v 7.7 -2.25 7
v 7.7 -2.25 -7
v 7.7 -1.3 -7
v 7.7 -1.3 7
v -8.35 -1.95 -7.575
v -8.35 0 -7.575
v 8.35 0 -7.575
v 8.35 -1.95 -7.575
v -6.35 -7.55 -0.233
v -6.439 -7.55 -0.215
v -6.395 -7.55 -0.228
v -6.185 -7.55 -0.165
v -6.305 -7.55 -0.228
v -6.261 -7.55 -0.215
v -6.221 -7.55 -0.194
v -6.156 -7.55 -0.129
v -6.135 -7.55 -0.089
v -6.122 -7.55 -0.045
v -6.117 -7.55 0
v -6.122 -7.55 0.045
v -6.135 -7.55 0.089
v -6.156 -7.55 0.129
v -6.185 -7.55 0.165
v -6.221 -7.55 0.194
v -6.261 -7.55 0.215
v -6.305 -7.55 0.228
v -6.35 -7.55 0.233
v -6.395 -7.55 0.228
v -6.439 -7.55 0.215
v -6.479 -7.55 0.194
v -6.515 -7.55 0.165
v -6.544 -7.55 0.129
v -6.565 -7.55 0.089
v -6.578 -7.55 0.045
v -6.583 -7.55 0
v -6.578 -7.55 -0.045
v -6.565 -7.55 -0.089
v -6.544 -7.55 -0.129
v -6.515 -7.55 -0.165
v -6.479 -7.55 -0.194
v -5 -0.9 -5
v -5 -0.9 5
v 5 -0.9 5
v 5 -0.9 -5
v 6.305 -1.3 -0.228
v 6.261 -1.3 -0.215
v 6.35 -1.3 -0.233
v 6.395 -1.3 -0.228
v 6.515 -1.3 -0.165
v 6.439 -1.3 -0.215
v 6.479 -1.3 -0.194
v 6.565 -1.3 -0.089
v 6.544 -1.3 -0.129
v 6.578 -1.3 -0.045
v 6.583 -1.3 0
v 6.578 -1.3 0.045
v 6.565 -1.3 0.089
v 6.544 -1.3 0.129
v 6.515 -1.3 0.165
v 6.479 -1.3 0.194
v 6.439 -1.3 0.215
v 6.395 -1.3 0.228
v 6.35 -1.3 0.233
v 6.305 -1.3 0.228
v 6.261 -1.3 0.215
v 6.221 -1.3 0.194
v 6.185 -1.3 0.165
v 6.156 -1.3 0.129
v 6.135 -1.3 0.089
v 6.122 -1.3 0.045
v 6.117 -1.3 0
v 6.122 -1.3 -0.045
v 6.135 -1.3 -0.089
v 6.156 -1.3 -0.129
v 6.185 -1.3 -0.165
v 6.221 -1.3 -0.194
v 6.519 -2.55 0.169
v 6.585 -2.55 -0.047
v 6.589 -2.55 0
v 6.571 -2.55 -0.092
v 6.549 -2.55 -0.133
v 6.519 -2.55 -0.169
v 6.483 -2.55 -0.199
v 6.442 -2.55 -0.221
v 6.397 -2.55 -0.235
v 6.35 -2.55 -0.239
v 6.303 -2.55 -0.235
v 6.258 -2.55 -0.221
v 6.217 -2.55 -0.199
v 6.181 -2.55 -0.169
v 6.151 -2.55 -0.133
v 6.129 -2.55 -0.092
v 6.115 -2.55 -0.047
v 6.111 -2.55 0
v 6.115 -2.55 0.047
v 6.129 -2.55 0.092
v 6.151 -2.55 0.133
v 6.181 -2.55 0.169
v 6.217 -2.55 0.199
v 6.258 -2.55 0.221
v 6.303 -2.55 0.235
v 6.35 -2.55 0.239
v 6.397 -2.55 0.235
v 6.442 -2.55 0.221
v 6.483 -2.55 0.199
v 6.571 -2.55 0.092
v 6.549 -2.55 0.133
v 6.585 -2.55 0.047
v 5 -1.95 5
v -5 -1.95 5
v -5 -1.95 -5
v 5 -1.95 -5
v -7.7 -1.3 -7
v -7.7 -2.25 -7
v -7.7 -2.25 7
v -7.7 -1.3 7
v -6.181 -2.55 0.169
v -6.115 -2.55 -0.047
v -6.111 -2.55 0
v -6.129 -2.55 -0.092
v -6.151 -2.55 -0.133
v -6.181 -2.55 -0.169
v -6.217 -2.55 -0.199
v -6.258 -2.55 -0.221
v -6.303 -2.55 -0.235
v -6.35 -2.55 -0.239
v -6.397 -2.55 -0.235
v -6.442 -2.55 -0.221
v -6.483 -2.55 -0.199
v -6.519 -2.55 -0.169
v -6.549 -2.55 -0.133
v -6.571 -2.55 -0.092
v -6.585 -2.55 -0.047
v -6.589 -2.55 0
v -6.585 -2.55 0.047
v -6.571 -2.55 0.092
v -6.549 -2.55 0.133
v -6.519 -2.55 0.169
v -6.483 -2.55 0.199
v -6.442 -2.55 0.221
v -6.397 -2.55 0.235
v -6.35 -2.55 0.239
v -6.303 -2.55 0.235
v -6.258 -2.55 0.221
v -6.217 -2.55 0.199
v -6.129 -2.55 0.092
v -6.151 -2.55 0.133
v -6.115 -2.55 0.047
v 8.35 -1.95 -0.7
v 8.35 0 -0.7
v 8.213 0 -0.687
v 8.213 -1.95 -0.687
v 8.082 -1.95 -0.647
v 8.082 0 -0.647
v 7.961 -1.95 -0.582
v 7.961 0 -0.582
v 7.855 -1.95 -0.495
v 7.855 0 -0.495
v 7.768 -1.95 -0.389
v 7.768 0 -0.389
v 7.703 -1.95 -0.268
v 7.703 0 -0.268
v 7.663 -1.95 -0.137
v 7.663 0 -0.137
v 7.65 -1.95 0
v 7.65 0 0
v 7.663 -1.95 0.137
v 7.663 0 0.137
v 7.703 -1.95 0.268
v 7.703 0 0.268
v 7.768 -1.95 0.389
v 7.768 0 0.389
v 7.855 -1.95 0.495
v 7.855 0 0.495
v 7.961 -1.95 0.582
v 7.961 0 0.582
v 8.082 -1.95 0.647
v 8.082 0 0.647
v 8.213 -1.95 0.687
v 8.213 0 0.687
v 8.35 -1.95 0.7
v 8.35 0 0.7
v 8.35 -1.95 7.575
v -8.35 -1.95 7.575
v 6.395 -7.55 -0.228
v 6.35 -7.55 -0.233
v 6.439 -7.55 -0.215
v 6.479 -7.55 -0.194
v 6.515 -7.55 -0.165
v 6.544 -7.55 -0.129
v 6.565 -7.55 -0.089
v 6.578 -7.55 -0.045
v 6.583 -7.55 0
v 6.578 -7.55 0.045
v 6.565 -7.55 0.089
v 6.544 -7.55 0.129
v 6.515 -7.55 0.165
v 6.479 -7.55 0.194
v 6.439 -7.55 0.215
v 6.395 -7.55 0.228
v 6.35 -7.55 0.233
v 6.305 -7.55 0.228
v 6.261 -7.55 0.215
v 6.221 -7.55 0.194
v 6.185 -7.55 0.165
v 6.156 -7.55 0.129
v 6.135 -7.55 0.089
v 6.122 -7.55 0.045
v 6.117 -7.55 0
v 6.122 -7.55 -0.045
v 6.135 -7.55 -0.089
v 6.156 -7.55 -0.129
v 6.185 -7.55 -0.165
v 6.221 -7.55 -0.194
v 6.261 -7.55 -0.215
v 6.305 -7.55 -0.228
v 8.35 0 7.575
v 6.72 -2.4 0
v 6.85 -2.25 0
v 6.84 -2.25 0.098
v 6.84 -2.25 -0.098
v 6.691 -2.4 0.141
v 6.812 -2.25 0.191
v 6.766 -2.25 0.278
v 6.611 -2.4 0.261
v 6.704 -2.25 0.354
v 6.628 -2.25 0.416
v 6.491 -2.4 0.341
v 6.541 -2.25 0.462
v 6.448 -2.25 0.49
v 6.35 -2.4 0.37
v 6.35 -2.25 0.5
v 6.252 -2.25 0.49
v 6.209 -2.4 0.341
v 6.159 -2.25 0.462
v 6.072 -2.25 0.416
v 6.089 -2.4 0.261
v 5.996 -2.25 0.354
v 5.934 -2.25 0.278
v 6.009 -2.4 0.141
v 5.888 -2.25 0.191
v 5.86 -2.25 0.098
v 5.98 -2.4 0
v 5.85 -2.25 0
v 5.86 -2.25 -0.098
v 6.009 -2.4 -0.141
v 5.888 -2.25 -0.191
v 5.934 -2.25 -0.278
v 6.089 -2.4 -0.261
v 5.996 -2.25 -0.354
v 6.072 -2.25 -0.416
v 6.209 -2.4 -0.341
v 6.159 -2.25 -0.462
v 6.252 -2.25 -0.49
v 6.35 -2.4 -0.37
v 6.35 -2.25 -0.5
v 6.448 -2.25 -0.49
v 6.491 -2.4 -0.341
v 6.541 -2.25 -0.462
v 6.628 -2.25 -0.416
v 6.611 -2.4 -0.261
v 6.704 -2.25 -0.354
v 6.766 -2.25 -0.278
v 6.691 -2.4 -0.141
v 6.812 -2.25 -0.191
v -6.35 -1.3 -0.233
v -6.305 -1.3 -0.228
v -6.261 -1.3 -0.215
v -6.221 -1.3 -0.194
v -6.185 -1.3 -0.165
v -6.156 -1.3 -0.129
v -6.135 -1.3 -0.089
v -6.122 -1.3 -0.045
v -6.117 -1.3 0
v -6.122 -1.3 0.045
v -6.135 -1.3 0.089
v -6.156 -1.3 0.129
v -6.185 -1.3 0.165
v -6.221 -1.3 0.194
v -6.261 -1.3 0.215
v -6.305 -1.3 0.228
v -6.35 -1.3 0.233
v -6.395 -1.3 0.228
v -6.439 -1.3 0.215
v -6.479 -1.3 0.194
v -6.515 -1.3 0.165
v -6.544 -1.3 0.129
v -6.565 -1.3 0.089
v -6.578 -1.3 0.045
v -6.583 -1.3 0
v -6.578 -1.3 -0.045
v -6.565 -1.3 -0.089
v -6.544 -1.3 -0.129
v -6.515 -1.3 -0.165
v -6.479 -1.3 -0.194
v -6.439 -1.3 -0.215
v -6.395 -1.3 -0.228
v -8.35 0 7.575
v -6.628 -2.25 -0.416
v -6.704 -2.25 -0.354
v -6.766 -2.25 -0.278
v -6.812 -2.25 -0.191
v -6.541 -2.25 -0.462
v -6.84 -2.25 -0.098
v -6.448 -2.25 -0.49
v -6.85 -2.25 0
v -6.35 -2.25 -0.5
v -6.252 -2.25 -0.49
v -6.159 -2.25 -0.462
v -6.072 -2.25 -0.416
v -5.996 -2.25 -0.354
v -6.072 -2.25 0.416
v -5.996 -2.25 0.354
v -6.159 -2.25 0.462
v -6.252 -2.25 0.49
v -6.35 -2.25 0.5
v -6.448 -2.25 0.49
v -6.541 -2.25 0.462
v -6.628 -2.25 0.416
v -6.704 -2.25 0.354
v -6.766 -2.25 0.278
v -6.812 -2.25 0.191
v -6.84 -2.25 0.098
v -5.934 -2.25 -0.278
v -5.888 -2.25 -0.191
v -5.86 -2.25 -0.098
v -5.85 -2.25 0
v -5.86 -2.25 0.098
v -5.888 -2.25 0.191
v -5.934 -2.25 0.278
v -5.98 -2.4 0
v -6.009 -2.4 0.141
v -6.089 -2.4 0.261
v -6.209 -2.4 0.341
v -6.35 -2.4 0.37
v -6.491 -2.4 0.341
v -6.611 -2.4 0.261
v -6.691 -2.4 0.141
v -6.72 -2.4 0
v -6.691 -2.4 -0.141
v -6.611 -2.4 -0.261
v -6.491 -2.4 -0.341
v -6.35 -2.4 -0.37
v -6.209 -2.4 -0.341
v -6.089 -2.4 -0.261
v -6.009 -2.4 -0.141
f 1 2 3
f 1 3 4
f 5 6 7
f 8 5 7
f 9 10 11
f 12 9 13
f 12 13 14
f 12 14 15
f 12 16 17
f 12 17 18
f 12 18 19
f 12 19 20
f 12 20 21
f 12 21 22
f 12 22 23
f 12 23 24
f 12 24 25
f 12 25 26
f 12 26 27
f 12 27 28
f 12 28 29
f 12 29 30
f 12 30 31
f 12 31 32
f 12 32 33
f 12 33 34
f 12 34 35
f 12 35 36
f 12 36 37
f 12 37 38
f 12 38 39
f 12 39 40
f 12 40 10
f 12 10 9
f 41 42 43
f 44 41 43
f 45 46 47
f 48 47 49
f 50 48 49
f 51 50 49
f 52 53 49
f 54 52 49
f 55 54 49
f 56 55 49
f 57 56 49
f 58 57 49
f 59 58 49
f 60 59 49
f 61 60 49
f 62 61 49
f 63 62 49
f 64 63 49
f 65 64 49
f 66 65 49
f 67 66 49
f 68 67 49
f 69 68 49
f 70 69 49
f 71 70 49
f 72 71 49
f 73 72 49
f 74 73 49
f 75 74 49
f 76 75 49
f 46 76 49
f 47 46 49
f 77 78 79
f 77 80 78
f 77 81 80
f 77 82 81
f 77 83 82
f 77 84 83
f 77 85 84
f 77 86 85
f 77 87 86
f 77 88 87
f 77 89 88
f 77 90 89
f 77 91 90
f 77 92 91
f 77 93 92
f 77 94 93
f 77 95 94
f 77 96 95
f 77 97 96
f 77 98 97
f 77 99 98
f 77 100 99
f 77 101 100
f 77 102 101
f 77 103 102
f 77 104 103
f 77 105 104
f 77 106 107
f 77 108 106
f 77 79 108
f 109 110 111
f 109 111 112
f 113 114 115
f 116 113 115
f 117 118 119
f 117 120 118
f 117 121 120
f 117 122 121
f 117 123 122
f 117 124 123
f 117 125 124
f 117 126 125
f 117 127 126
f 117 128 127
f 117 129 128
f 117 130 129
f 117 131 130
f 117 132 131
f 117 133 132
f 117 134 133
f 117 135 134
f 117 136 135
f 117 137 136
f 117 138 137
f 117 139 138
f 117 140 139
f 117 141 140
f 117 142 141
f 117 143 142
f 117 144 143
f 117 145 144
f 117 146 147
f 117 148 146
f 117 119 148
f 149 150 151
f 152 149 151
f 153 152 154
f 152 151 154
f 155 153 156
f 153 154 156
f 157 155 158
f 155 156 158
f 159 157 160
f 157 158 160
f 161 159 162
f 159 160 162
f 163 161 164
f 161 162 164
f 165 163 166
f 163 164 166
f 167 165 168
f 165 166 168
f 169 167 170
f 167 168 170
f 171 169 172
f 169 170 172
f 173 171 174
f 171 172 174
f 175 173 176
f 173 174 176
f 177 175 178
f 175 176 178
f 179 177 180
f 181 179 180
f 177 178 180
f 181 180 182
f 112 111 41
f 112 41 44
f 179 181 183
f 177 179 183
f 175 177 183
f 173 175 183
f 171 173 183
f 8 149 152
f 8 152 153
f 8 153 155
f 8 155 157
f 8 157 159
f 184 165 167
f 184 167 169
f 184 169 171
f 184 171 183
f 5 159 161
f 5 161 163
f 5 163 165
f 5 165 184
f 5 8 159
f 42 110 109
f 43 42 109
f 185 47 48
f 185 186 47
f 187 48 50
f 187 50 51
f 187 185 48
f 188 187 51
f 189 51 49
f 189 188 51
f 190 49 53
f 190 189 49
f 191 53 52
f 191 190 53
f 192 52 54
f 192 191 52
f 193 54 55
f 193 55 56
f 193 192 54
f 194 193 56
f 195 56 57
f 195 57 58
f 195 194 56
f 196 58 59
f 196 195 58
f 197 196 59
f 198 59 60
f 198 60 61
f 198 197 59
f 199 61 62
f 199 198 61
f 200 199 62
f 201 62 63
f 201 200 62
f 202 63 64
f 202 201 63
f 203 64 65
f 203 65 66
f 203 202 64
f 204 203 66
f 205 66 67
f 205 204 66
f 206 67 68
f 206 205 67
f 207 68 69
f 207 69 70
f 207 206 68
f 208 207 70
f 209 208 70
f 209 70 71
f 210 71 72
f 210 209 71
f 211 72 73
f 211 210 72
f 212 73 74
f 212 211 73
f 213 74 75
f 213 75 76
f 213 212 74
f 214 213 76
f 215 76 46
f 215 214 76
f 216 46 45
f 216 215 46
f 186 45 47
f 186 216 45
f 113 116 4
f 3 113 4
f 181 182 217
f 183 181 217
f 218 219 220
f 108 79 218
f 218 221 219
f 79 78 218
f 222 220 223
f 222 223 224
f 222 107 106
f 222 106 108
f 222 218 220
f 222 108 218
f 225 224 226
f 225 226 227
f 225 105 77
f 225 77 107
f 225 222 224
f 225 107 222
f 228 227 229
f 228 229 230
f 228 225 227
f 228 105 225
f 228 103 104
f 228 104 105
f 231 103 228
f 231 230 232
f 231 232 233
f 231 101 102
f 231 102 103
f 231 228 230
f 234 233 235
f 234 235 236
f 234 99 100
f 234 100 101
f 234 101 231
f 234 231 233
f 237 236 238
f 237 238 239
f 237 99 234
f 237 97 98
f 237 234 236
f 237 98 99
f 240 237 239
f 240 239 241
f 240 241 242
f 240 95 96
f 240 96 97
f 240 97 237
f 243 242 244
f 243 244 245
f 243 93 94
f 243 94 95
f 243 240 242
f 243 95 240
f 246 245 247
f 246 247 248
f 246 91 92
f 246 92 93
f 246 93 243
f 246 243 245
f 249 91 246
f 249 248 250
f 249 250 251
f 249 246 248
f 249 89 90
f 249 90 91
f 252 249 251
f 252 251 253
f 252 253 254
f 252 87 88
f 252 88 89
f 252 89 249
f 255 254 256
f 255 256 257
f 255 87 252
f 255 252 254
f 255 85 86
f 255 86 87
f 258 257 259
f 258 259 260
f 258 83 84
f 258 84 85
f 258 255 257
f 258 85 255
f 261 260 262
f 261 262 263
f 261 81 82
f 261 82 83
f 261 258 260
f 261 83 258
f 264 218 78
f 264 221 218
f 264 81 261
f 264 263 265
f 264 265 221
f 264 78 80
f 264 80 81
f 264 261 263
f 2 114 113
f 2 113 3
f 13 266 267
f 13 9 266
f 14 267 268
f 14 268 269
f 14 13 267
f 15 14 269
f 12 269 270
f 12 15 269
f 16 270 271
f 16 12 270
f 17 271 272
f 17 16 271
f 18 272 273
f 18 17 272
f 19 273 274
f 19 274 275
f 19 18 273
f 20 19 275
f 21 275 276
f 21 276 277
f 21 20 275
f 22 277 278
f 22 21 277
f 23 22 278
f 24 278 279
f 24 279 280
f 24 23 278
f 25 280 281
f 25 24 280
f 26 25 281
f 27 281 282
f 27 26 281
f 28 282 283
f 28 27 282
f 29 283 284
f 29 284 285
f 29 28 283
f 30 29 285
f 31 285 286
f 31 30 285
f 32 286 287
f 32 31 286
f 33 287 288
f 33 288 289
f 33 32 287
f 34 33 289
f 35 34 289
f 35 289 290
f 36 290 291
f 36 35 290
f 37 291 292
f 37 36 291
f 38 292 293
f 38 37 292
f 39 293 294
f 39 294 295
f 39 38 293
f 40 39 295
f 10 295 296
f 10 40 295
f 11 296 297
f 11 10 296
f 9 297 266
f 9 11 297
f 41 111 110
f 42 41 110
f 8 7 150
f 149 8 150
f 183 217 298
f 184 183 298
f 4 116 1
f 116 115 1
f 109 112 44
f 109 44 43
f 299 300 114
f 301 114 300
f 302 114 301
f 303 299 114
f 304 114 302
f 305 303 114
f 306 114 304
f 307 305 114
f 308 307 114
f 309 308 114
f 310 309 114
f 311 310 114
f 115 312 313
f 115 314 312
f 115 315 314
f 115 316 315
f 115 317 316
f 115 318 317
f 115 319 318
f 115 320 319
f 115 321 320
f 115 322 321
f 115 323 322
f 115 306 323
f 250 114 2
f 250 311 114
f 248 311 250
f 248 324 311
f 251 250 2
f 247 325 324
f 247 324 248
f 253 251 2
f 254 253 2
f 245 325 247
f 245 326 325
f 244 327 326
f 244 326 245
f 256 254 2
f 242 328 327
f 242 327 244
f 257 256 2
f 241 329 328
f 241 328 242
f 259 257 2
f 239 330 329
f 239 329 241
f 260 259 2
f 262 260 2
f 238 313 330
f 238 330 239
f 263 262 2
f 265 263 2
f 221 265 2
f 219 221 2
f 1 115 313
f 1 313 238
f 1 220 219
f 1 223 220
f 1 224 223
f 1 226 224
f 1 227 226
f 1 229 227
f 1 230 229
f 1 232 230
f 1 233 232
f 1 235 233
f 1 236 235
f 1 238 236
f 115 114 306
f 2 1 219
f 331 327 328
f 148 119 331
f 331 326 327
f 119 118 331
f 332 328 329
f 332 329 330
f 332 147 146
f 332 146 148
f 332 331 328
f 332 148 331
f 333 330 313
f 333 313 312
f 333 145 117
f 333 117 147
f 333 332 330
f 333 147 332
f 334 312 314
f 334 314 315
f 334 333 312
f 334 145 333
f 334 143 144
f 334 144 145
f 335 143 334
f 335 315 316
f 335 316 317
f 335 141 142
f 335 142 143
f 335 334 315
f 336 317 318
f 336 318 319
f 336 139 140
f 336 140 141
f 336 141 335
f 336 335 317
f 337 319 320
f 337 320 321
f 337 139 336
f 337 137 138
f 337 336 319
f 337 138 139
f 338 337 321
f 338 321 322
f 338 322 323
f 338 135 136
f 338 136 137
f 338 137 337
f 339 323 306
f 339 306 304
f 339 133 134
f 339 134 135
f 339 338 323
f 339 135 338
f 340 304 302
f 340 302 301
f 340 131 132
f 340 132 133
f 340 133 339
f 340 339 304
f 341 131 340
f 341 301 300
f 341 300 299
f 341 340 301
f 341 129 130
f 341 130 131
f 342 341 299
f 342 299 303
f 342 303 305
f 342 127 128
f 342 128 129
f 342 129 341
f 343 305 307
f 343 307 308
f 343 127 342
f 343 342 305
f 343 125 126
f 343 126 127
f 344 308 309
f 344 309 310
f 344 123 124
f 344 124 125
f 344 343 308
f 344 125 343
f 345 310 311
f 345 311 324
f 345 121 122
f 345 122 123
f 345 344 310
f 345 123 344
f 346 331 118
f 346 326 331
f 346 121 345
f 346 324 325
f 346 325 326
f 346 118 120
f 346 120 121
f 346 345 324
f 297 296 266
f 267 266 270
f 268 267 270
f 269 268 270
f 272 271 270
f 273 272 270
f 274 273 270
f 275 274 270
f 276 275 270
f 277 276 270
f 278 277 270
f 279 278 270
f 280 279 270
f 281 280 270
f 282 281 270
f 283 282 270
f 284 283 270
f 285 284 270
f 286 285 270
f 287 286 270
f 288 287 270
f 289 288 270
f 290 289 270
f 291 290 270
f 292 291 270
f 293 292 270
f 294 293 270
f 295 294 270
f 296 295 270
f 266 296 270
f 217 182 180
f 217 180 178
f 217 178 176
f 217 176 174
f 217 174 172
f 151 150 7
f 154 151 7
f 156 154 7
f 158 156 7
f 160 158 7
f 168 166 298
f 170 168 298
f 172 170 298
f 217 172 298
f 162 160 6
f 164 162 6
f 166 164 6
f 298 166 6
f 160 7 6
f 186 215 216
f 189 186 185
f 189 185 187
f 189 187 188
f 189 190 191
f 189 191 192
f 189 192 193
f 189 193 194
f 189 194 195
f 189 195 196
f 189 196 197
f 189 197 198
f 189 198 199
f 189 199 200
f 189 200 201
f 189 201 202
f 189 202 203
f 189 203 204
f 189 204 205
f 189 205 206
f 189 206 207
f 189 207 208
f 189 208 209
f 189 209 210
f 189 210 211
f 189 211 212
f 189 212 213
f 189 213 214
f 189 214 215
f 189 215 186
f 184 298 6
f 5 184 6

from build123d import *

# Parameters (mm, degrees)
BOSS_EXTRUDE1_DEPTH         = 1.95
SKETCH3_W                   = 10
SKETCH3_H                   = 10
BOSS_EXTRUDE6_DEPTH         = 1.05
SKETCH12_W                  = 15.4
SKETCH12_H                  = 14
BOSS_EXTRUDE11_DEPTH        = 0.3
BOSS_EXTRUDE11_DEPTH_BACK   = 0.65
SKETCH13_R                  = 0.5
BOSS_EXTRUDE12_DEPTH        = 0.3
BOSS_EXTRUDE12_TAPER        = 41
SKETCH14_R                  = 0.232885615
BOSS_EXTRUDE15_DEPTH        = 5
BOSS_EXTRUDE15_DEPTH_BACK   = 1.25
BOSS_EXTRUDE15_2_DEPTH      = 5
BOSS_EXTRUDE15_2_DEPTH_BACK = 1.25


with BuildPart() as part:
    # Sketch1 → Boss-Extrude1 (new body)
    with BuildSketch(Plane(origin=(0, 0, 0), x_dir=(1, 0, 0), z_dir=(0, 1, 0))):
        with BuildLine():
            Line((8.35, -0.7), (8.35, -7.575))
            Line((8.35, -7.575), (-8.35, -7.575))
            Line((-8.35, -7.575), (-8.35, 7.575))
            Line((-8.35, 7.575), (8.35, 7.575))
            Line((8.35, 7.575), (8.35, 0.7))
            ThreePointArc((8.35, 0.7), (7.65, 0), (8.35, -0.7))
        make_face()
    extrude(amount=-BOSS_EXTRUDE1_DEPTH)


with BuildPart() as body_2:
    # Sketch3 → Boss-Extrude6 (new body)
    with BuildSketch(Plane.XZ.offset(1.95)):
        Rectangle(SKETCH3_W, SKETCH3_H)
    extrude(amount=-BOSS_EXTRUDE6_DEPTH)


with BuildPart() as body_3:
    # Sketch12 → Boss-Extrude11 (new body, two sides)
    with BuildSketch(Plane.XZ.offset(1.95)) as boss_extrude11_sk:
        Rectangle(SKETCH12_W, SKETCH12_H)
    extrude(amount=BOSS_EXTRUDE11_DEPTH)
    extrude(boss_extrude11_sk.sketch, amount=-BOSS_EXTRUDE11_DEPTH_BACK)

    # Sketch13 → Boss-Extrude12 (add)
    with BuildSketch(Plane.XZ.offset(2.25)):
        with Locations((-6.35, 0)):
            Circle(SKETCH13_R)
        with Locations((6.35, 0)):
            Circle(SKETCH13_R)
    extrude(amount=BOSS_EXTRUDE12_DEPTH, taper=BOSS_EXTRUDE12_TAPER)


with BuildPart() as body_4:
    # Sketch14 → Boss-Extrude15 (new body, two sides)
    with BuildSketch(Plane.XZ.offset(2.55)) as boss_extrude15_sk:
        with Locations(Location((-6.35, 0, 0), (0, 0, 270))):  # turned: the seam where the file's is
            Circle(SKETCH14_R)
    extrude(amount=BOSS_EXTRUDE15_DEPTH)
    extrude(boss_extrude15_sk.sketch, amount=-BOSS_EXTRUDE15_DEPTH_BACK)


with BuildPart() as body_5:
    # Sketch14 → Boss-Extrude15 2 (new body, two sides)
    with BuildSketch(Plane.XZ.offset(2.55)) as boss_extrude15_2_sk:
        with Locations(Location((6.35, 0, 0), (0, 0, 270))):  # turned: the seam where the file's is
            Circle(SKETCH14_R)
    extrude(amount=BOSS_EXTRUDE15_2_DEPTH)
    extrude(boss_extrude15_2_sk.sketch, amount=-BOSS_EXTRUDE15_2_DEPTH_BACK)


solid = Compound([part.part, body_2.part, body_3.part, body_4.part, body_5.part])
